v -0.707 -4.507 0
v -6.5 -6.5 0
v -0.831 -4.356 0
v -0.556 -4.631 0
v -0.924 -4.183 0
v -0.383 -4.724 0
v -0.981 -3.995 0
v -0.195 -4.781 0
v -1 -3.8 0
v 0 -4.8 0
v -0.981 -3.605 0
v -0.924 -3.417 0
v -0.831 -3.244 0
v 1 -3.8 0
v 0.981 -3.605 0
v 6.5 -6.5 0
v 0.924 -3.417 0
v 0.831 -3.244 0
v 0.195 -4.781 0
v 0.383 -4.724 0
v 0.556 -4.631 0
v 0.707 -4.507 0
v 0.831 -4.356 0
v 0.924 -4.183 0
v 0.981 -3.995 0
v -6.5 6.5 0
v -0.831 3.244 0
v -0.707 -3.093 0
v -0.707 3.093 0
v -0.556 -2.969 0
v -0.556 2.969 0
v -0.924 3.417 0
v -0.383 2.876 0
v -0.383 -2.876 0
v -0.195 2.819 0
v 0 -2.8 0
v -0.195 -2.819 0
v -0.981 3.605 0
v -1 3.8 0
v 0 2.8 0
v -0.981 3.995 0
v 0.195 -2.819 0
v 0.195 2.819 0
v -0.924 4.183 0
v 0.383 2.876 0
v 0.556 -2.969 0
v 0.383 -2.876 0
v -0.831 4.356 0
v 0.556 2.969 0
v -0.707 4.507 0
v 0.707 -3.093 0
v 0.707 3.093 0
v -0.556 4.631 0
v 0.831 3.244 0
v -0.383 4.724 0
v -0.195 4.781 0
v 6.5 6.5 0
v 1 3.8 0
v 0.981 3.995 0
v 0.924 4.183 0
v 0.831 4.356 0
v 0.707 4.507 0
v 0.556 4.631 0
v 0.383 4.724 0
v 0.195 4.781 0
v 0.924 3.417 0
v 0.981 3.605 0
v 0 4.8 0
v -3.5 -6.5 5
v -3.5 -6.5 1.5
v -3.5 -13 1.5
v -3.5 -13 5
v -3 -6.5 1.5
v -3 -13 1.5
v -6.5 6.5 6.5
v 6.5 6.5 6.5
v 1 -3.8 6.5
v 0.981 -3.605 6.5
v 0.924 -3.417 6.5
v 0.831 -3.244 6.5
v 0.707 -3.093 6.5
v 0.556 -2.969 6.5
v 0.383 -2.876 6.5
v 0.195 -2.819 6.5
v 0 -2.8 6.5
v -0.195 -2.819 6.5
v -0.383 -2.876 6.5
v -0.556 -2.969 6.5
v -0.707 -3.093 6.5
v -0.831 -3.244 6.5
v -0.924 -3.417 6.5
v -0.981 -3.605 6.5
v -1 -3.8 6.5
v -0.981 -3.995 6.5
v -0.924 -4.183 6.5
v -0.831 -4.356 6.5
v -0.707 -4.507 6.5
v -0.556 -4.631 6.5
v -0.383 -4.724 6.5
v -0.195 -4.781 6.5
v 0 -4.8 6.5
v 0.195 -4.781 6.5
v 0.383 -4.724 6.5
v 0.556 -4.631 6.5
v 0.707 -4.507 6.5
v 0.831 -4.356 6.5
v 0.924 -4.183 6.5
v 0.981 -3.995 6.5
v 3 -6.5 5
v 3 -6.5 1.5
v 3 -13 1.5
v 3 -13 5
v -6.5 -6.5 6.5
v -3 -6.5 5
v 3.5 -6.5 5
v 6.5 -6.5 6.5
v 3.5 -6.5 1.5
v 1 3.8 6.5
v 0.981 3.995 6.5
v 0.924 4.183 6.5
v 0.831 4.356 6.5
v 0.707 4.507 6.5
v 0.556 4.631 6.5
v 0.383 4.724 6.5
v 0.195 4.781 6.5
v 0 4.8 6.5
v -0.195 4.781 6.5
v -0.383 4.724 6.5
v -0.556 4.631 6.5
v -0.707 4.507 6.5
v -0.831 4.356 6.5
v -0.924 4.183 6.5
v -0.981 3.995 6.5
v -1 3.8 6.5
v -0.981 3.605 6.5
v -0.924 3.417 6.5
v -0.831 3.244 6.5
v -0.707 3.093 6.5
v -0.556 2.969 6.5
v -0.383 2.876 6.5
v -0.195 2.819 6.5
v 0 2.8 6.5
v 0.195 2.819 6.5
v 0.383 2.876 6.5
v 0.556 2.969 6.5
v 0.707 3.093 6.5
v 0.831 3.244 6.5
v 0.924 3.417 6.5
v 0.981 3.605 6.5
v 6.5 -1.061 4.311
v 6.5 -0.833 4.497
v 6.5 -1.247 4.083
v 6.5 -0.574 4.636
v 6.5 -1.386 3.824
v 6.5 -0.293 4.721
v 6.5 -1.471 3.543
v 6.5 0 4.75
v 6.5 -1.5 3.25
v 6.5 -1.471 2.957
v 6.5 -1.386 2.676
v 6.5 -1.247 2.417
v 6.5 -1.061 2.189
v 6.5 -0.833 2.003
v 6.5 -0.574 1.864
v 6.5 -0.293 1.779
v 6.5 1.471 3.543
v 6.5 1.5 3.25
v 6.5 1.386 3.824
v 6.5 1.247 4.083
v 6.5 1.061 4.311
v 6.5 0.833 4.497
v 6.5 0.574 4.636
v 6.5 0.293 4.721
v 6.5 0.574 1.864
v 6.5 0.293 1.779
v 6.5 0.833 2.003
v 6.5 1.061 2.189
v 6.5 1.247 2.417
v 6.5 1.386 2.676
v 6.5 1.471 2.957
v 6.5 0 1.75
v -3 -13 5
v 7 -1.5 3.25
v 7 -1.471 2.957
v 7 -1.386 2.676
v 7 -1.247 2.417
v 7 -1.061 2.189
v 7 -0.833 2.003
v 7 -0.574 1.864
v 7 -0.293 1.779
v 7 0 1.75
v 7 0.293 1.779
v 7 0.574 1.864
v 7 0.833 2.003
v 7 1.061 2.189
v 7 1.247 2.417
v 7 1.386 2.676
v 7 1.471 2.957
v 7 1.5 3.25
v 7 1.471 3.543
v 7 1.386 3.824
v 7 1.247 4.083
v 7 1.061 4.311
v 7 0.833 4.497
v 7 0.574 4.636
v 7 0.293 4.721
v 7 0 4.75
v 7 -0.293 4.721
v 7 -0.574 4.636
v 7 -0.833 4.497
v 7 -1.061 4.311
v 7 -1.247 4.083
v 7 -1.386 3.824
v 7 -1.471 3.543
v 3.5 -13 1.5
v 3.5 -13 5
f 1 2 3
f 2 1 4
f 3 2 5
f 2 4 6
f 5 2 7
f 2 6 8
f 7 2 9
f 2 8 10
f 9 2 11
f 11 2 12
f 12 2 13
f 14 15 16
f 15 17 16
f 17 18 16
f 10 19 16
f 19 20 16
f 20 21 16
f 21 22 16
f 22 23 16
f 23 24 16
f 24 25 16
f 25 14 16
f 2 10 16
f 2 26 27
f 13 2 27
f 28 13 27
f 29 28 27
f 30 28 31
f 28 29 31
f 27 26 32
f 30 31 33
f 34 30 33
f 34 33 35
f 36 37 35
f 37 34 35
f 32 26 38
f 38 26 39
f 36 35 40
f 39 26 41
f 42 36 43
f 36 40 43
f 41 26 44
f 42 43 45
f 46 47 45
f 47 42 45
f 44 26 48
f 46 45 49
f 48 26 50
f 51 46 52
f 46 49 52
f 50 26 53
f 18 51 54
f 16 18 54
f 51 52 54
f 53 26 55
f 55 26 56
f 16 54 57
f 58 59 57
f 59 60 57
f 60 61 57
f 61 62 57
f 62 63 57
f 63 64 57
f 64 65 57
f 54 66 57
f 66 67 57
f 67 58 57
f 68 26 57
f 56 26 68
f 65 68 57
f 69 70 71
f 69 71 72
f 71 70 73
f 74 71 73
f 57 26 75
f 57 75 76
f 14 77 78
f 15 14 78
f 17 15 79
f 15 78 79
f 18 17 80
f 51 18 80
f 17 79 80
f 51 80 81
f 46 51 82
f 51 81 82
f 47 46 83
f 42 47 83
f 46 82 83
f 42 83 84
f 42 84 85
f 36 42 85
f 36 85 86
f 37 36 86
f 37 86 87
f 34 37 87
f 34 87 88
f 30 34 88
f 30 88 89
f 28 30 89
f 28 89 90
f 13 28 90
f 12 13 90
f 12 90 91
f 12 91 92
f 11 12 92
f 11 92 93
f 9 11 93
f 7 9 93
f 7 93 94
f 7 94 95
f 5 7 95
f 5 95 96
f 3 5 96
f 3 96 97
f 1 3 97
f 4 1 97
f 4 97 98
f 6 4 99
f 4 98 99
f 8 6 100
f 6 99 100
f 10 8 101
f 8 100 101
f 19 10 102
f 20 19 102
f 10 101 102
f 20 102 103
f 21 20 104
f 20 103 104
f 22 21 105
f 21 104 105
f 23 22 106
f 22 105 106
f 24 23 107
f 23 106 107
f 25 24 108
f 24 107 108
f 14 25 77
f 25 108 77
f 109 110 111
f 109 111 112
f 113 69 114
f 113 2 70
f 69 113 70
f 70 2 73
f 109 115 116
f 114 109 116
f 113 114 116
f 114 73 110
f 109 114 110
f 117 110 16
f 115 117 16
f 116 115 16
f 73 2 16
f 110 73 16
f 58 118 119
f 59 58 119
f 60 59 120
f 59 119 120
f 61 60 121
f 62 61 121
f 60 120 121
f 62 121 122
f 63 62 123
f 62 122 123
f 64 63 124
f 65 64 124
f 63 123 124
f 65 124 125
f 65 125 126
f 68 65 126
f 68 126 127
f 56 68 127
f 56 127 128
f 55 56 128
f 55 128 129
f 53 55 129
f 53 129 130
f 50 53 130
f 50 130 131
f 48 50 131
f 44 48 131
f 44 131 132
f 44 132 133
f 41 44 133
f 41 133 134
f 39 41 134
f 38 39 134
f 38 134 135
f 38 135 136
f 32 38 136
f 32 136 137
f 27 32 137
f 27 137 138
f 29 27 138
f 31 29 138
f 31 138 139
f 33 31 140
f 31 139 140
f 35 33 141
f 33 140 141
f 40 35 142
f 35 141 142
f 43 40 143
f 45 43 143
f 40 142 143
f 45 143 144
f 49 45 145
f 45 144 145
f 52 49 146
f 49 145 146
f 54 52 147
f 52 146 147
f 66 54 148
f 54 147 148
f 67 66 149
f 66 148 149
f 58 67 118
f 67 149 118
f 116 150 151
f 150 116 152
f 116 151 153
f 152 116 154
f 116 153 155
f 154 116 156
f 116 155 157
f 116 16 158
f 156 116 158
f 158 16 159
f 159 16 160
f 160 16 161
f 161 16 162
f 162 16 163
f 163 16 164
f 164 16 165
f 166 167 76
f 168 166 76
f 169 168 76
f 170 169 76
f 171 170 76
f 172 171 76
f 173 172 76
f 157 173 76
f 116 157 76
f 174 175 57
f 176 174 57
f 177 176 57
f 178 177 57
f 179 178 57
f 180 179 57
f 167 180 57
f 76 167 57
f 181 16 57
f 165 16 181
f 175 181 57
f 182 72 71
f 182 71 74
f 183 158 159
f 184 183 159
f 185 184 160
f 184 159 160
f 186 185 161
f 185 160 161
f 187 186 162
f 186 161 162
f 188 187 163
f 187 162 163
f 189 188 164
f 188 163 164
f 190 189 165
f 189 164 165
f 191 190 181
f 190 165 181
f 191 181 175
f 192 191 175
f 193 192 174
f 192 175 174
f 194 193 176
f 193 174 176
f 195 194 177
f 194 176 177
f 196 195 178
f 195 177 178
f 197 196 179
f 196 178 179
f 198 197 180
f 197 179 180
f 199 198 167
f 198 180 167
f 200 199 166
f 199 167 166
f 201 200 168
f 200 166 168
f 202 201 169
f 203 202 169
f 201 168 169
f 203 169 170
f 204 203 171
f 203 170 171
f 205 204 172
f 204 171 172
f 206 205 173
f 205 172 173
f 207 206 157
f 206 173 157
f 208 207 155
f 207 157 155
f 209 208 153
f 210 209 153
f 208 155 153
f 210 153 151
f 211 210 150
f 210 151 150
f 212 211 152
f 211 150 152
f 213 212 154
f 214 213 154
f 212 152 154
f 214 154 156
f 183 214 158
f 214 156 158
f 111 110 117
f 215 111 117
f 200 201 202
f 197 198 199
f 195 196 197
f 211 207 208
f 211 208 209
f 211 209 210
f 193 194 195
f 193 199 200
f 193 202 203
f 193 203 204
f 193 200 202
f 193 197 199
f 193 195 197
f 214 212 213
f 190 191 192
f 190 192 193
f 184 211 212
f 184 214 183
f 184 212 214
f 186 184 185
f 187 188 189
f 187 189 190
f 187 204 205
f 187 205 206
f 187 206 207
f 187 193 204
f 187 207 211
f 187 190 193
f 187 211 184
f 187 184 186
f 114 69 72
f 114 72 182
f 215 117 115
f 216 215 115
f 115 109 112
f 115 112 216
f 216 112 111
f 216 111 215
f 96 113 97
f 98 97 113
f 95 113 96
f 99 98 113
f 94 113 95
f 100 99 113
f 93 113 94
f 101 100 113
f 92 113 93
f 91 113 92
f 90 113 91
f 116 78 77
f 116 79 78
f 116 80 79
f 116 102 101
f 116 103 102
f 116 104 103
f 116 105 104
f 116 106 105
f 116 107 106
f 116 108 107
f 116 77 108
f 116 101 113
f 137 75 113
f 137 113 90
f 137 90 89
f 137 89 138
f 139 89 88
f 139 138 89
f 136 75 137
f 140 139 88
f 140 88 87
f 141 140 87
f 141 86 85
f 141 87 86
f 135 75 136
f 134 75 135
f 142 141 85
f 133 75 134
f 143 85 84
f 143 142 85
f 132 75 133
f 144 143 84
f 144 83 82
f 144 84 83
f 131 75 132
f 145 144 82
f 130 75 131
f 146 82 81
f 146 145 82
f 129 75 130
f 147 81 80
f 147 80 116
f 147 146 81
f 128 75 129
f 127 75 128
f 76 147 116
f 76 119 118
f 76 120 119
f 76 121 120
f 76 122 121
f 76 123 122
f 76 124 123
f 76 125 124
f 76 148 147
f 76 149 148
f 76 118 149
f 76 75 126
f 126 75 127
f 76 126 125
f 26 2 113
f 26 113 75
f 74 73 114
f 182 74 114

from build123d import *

# Parameters (mm, degrees)
SKETCH1_W           = 13
SKETCH1_H           = 13
BOSS_EXTRUDE1_DEPTH = 6.5
SKETCH2_W           = 0.5
SKETCH2_H           = 3.5
BOSS_EXTRUDE2_DEPTH = 6.5
SKETCH3_R           = 1
CUT_EXTRUDE1_DEPTH  = 16.921683328
SKETCH4_R           = 1.5
BOSS_EXTRUDE3_DEPTH = 0.5


with BuildPart() as part:
    # Sketch1 → Boss-Extrude1 (new body)
    with BuildSketch(Plane.XY):
        Rectangle(SKETCH1_W, SKETCH1_H)
    extrude(amount=BOSS_EXTRUDE1_DEPTH)

    # Sketch2 → Boss-Extrude2 (add)
    with BuildSketch(Plane.XZ.offset(6.5)):
        with Locations((-3.25, 3.25)):
            Rectangle(SKETCH2_W, SKETCH2_H)
        with Locations((3.25, 3.25)):
            Rectangle(SKETCH2_W, SKETCH2_H)
    extrude(amount=BOSS_EXTRUDE2_DEPTH)

    # Sketch3 → Cut-Extrude1 (cut, through all)
    with BuildSketch(Plane.XY.offset(6.5)):
        with Locations((0, 3.8)):
            Circle(SKETCH3_R)
        with Locations((0, -3.8)):
            Circle(SKETCH3_R)
    extrude(amount=-CUT_EXTRUDE1_DEPTH, mode=Mode.SUBTRACT)

    # Sketch4 → Boss-Extrude3 (add)
    with BuildSketch(Plane(origin=(6.5, 0, 0), x_dir=(0, 0, -1), z_dir=(1, 0, 0))):
        with Locations(Location((-3.25, 0, 0), (0, 0, 270))):
            Circle(SKETCH4_R)
    extrude(amount=BOSS_EXTRUDE3_DEPTH)


solid = part.part
